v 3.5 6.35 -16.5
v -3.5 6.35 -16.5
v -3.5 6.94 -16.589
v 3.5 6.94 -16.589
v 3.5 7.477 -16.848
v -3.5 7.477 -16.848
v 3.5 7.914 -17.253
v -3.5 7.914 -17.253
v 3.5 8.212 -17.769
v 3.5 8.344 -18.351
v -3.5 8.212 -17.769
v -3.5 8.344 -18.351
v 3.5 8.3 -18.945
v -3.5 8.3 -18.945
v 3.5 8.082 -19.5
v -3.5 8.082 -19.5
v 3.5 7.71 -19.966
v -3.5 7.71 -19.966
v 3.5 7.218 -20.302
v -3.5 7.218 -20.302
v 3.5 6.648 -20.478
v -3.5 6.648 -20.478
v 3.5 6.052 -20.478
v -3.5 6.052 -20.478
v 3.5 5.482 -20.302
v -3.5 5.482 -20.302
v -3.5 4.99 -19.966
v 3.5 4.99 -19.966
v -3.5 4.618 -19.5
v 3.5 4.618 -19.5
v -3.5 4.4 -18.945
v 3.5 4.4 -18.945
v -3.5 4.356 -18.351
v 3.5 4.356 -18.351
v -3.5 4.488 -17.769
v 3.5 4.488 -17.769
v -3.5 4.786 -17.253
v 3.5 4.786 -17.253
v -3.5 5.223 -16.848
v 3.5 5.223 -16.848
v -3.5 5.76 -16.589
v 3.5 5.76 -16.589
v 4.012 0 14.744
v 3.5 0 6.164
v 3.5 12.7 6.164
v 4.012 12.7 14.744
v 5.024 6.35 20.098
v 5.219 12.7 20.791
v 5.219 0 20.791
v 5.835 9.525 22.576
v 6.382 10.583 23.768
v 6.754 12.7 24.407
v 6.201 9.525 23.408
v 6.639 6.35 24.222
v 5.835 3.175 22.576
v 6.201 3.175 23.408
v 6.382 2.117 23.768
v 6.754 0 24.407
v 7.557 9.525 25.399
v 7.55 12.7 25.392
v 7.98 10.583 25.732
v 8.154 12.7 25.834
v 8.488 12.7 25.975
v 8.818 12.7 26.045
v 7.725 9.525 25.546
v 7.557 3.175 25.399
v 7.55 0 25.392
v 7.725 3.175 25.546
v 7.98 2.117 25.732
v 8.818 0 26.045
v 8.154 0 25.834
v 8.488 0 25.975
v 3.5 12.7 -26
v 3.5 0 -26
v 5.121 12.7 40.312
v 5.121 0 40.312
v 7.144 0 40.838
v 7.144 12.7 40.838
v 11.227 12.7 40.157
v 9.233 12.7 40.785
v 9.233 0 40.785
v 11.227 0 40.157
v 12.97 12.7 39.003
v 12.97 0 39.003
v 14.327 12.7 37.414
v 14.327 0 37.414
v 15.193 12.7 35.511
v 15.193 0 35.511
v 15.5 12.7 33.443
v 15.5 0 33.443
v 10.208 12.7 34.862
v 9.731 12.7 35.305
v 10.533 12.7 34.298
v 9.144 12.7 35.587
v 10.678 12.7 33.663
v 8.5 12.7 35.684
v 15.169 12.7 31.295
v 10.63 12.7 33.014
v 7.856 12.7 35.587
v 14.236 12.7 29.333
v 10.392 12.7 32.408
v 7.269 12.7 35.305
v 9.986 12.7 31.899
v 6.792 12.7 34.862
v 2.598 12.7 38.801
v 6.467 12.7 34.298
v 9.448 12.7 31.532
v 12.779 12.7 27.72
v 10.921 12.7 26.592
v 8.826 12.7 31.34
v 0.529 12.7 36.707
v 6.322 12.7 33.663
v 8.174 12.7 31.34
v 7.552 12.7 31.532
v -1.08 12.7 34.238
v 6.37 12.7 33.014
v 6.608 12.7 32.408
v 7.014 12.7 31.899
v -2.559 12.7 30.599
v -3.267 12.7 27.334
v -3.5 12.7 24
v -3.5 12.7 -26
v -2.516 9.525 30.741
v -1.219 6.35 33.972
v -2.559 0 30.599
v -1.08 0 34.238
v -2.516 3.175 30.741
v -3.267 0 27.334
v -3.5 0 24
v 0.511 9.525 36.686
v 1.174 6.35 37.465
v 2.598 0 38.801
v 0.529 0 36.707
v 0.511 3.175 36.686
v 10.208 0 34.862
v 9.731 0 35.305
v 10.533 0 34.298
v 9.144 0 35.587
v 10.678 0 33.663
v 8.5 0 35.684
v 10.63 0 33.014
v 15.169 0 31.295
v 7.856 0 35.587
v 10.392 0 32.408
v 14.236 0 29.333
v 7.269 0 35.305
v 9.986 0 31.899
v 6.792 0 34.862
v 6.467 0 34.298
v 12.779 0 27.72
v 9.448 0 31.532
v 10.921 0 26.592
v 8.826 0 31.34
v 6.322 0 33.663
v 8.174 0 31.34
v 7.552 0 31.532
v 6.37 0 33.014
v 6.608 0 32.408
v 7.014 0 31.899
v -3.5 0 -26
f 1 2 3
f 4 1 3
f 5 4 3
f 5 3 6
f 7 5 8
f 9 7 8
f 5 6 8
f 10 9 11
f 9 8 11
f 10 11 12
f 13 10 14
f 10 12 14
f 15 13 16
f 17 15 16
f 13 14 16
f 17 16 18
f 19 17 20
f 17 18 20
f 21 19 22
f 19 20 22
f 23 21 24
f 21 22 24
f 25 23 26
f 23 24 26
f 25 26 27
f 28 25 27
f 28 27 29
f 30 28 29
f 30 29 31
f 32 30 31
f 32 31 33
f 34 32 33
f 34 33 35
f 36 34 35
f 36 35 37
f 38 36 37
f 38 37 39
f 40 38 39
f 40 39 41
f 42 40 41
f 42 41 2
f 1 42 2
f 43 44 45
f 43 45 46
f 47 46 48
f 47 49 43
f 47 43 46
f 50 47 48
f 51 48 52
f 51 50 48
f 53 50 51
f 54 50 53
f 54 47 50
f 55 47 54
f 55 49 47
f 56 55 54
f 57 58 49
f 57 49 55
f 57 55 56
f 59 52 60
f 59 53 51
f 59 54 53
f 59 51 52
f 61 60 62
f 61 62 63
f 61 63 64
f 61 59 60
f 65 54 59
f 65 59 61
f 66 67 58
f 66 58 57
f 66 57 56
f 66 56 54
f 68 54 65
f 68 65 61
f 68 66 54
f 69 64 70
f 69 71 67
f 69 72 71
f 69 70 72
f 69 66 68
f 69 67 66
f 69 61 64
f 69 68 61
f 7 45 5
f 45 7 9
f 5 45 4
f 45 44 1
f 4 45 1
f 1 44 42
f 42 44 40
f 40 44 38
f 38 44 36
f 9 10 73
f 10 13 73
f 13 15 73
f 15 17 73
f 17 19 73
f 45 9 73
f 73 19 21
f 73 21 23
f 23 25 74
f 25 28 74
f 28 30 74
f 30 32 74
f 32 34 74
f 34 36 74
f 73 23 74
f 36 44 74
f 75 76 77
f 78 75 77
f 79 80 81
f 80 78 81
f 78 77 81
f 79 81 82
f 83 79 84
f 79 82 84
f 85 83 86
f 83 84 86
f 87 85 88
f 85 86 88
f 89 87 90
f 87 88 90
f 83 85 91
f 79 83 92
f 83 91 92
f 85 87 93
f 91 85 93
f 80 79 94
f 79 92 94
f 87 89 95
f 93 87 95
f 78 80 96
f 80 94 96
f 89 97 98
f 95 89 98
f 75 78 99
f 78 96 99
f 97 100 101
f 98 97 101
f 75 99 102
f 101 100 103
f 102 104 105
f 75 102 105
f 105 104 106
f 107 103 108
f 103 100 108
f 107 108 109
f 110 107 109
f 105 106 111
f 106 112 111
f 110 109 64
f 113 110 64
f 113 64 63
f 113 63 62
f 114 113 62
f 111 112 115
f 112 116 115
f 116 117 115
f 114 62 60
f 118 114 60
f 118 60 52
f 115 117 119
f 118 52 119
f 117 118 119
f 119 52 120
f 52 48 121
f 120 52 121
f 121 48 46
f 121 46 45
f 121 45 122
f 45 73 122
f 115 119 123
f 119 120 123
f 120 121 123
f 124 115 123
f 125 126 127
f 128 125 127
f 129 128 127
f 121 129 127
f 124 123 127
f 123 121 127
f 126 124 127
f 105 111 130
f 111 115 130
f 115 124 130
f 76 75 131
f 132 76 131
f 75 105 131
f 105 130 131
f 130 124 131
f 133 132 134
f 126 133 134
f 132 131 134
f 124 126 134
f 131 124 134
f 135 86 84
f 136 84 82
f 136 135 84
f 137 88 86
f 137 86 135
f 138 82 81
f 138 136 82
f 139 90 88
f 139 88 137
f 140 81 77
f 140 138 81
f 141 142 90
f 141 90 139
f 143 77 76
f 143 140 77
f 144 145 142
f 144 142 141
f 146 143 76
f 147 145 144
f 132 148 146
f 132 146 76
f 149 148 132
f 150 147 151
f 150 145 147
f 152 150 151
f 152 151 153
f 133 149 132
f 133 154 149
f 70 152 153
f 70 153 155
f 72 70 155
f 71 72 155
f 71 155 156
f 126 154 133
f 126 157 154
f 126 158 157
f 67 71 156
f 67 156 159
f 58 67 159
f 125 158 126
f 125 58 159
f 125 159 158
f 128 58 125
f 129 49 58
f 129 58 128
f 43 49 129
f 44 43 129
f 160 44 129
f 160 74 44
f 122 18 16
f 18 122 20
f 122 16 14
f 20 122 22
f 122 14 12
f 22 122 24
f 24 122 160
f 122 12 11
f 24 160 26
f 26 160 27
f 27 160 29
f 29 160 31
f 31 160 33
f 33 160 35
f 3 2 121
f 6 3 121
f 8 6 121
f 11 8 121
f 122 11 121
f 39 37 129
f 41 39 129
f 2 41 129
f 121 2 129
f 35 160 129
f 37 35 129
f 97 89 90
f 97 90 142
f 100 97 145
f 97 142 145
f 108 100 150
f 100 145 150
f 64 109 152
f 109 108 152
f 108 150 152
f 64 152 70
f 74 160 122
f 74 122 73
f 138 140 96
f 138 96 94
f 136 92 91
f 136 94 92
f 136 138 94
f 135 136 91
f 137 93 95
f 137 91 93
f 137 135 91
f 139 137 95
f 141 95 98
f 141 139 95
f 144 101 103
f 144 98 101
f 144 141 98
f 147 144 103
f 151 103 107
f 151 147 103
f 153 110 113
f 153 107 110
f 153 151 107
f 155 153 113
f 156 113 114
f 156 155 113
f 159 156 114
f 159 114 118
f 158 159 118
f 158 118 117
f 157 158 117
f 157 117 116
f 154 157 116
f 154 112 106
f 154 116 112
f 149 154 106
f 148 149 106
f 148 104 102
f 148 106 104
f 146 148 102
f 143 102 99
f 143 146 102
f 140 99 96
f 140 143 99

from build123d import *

# Parameters (mm, degrees)
SKETCH1_W               = 7
SKETCH1_H               = 52
BOSS_EXTRUDE1_DEPTH     = 12.7
SKETCH2_R               = 2
CUT_EXTRUDE1_DEPTH      = 10
SKETCH3_W               = 24
SKETCH3_H               = 15
BOSS_EXTRUDE2_DEPTH     = 12.7
CUT_EXTRUDE2_DEPTH      = 48.566164445
CUT_EXTRUDE2_DEPTH_BACK = 48.566164445
SKETCH4_R               = 2.1844
FILLET1_SIZE            = 17
FILLET1_SIZE_2          = 12
CUT_EXTRUDE3_DEPTH      = 48.566164601
CUT_EXTRUDE3_DEPTH_BACK = 48.566164601
SKETCH5_W               = 5
SKETCH5_H               = 15
FILLET2_R               = 7.5
FILLET3_DEPTH           = 12.7


with BuildPart() as part:
    # Sketch1 → Boss-Extrude1 (new body)
    with BuildSketch(Plane(origin=(0, 0, 0), x_dir=(1, 0, 0), z_dir=(0, 1, 0))):
        Rectangle(SKETCH1_W, SKETCH1_H)
    extrude(amount=BOSS_EXTRUDE1_DEPTH)

    # Sketch2 → Cut-Extrude1 (cut)
    with BuildSketch(Plane.ZY.offset(3.5)):
        with Locations((-18.5, 6.35)):
            Circle(SKETCH2_R)
    extrude(amount=-CUT_EXTRUDE1_DEPTH, mode=Mode.SUBTRACT)

    # Sketch3 → Boss-Extrude2 (add)
    with BuildSketch(Plane.XZ):
        with Locations((8.5, 33.5)):
            Rectangle(SKETCH3_W, SKETCH3_H)
    extrude(amount=-BOSS_EXTRUDE2_DEPTH)

    # Sketch4 → Cut-Extrude2 (cut, two sides: drawn at the far end of the back side and taken through both)
    with BuildSketch(Plane(origin=(0, 12.7, 0), x_dir=(1, 0, 0), z_dir=(0, 1, 0)).offset(-CUT_EXTRUDE2_DEPTH_BACK)):
        with Locations(Location((8.5, -33.5, 0), (0, 0, 270))):
            Circle(SKETCH4_R)
    extrude(amount=CUT_EXTRUDE2_DEPTH + CUT_EXTRUDE2_DEPTH_BACK, mode=Mode.SUBTRACT)

    # Fillet1
    # a fillet whose section is not a circle: 17, 12 mm, written as the material it takes off along each edge
    with BuildSketch(Plane(origin=(-3.5, -42.5, 41), x_dir=(0, 0, -1), z_dir=(0, 1, 0))) as fillet1_piece_1:
        with BuildLine():
            Bezier((FILLET1_SIZE, 0), (0, 0), (0, -FILLET1_SIZE_2), weights=[1, 0.707106781, 1])
            Line((0, -FILLET1_SIZE_2), (0, 0))
            Line((0, 0), (FILLET1_SIZE, 0))
        make_face()
    extrude(amount=97.7, mode=Mode.SUBTRACT)

    # Sketch5 → Cut-Extrude3 (cut, two sides: drawn at the far end of the back side and taken through both)
    with BuildSketch(Plane(origin=(0, 12.7, 0), x_dir=(1, 0, 0), z_dir=(0, 1, 0)).offset(-CUT_EXTRUDE3_DEPTH_BACK)):
        with Locations((18, -33.5)):
            Rectangle(SKETCH5_W, SKETCH5_H)
    extrude(amount=CUT_EXTRUDE3_DEPTH + CUT_EXTRUDE3_DEPTH_BACK, mode=Mode.SUBTRACT)

    # Fillet2
    # the kernel refuses this fillet: 7.5 mm, written as the material it takes off along each edge
    with BuildSketch(Plane(origin=(15.5, -18.75, 26), x_dir=(-1, 0, 0), z_dir=(0, 1, 0))) as fillet2_piece_1:
        with BuildLine():
            CenterArc((FILLET2_R, FILLET2_R), FILLET2_R, 180, 90)
            Line((0, FILLET2_R), (0, 0))
            Line((0, 0), (FILLET2_R, 0))
        make_face()
    extrude(amount=50.2, mode=Mode.SUBTRACT)
    with BuildSketch(Plane(origin=(15.5, -26.005596716, 41), x_dir=(-0.9978099648287924, 0, -0.06614585465744831), z_dir=(0, 1, 0))) as fillet2_piece_2:
        with BuildLine():
            CenterArc((7.98716223, -7.10052151), FILLET2_R, 71.215463445, 112.577183941)
            Line((0.503587494, -7.59661542), (-0.24476998, -7.646224811))
            Line((-0.24476998, -7.646224811), (-0.748357474, -0.049609391))
            Line((-0.748357474, -0.049609391), (-0.049609391, 0.748357474))
            ThreePointArc((-0.049609391, 0.748357474), (6.935060363, 1.211378456), (10.643746332, 0.710052151))
            Line((10.643746332, 0.710052151), (10.402238686, 0))
        make_face()
    extrude(amount=64.711193432, mode=Mode.SUBTRACT)

    # Fillet3: read off the stored shape, not the designer's step
    # Fillet3 outline → Fillet3 (add)
    with BuildSketch(Plane(origin=(0, 0, 0), x_dir=(1, 0, 0), z_dir=(0, 1, 0))):
        with BuildLine():
            add(Edge.make_bspline(
                [(3.5, -6.164126134), (3.5, -25.461113038), (8.818181818, -26.044761673)],
                knots=[0, 0, 0, 1, 1, 1], degree=2, weights=[1, 0.744678088, 1]))
            Line((3.5, -6.164126134), (3.5, -26))
            Line((3.5, -26), (8, -26))
            ThreePointArc((8, -26), (8.409702665, -26.011198779), (8.818181818, -26.044761673))
        make_face()
    extrude(amount=FILLET3_DEPTH)


solid = part.part
